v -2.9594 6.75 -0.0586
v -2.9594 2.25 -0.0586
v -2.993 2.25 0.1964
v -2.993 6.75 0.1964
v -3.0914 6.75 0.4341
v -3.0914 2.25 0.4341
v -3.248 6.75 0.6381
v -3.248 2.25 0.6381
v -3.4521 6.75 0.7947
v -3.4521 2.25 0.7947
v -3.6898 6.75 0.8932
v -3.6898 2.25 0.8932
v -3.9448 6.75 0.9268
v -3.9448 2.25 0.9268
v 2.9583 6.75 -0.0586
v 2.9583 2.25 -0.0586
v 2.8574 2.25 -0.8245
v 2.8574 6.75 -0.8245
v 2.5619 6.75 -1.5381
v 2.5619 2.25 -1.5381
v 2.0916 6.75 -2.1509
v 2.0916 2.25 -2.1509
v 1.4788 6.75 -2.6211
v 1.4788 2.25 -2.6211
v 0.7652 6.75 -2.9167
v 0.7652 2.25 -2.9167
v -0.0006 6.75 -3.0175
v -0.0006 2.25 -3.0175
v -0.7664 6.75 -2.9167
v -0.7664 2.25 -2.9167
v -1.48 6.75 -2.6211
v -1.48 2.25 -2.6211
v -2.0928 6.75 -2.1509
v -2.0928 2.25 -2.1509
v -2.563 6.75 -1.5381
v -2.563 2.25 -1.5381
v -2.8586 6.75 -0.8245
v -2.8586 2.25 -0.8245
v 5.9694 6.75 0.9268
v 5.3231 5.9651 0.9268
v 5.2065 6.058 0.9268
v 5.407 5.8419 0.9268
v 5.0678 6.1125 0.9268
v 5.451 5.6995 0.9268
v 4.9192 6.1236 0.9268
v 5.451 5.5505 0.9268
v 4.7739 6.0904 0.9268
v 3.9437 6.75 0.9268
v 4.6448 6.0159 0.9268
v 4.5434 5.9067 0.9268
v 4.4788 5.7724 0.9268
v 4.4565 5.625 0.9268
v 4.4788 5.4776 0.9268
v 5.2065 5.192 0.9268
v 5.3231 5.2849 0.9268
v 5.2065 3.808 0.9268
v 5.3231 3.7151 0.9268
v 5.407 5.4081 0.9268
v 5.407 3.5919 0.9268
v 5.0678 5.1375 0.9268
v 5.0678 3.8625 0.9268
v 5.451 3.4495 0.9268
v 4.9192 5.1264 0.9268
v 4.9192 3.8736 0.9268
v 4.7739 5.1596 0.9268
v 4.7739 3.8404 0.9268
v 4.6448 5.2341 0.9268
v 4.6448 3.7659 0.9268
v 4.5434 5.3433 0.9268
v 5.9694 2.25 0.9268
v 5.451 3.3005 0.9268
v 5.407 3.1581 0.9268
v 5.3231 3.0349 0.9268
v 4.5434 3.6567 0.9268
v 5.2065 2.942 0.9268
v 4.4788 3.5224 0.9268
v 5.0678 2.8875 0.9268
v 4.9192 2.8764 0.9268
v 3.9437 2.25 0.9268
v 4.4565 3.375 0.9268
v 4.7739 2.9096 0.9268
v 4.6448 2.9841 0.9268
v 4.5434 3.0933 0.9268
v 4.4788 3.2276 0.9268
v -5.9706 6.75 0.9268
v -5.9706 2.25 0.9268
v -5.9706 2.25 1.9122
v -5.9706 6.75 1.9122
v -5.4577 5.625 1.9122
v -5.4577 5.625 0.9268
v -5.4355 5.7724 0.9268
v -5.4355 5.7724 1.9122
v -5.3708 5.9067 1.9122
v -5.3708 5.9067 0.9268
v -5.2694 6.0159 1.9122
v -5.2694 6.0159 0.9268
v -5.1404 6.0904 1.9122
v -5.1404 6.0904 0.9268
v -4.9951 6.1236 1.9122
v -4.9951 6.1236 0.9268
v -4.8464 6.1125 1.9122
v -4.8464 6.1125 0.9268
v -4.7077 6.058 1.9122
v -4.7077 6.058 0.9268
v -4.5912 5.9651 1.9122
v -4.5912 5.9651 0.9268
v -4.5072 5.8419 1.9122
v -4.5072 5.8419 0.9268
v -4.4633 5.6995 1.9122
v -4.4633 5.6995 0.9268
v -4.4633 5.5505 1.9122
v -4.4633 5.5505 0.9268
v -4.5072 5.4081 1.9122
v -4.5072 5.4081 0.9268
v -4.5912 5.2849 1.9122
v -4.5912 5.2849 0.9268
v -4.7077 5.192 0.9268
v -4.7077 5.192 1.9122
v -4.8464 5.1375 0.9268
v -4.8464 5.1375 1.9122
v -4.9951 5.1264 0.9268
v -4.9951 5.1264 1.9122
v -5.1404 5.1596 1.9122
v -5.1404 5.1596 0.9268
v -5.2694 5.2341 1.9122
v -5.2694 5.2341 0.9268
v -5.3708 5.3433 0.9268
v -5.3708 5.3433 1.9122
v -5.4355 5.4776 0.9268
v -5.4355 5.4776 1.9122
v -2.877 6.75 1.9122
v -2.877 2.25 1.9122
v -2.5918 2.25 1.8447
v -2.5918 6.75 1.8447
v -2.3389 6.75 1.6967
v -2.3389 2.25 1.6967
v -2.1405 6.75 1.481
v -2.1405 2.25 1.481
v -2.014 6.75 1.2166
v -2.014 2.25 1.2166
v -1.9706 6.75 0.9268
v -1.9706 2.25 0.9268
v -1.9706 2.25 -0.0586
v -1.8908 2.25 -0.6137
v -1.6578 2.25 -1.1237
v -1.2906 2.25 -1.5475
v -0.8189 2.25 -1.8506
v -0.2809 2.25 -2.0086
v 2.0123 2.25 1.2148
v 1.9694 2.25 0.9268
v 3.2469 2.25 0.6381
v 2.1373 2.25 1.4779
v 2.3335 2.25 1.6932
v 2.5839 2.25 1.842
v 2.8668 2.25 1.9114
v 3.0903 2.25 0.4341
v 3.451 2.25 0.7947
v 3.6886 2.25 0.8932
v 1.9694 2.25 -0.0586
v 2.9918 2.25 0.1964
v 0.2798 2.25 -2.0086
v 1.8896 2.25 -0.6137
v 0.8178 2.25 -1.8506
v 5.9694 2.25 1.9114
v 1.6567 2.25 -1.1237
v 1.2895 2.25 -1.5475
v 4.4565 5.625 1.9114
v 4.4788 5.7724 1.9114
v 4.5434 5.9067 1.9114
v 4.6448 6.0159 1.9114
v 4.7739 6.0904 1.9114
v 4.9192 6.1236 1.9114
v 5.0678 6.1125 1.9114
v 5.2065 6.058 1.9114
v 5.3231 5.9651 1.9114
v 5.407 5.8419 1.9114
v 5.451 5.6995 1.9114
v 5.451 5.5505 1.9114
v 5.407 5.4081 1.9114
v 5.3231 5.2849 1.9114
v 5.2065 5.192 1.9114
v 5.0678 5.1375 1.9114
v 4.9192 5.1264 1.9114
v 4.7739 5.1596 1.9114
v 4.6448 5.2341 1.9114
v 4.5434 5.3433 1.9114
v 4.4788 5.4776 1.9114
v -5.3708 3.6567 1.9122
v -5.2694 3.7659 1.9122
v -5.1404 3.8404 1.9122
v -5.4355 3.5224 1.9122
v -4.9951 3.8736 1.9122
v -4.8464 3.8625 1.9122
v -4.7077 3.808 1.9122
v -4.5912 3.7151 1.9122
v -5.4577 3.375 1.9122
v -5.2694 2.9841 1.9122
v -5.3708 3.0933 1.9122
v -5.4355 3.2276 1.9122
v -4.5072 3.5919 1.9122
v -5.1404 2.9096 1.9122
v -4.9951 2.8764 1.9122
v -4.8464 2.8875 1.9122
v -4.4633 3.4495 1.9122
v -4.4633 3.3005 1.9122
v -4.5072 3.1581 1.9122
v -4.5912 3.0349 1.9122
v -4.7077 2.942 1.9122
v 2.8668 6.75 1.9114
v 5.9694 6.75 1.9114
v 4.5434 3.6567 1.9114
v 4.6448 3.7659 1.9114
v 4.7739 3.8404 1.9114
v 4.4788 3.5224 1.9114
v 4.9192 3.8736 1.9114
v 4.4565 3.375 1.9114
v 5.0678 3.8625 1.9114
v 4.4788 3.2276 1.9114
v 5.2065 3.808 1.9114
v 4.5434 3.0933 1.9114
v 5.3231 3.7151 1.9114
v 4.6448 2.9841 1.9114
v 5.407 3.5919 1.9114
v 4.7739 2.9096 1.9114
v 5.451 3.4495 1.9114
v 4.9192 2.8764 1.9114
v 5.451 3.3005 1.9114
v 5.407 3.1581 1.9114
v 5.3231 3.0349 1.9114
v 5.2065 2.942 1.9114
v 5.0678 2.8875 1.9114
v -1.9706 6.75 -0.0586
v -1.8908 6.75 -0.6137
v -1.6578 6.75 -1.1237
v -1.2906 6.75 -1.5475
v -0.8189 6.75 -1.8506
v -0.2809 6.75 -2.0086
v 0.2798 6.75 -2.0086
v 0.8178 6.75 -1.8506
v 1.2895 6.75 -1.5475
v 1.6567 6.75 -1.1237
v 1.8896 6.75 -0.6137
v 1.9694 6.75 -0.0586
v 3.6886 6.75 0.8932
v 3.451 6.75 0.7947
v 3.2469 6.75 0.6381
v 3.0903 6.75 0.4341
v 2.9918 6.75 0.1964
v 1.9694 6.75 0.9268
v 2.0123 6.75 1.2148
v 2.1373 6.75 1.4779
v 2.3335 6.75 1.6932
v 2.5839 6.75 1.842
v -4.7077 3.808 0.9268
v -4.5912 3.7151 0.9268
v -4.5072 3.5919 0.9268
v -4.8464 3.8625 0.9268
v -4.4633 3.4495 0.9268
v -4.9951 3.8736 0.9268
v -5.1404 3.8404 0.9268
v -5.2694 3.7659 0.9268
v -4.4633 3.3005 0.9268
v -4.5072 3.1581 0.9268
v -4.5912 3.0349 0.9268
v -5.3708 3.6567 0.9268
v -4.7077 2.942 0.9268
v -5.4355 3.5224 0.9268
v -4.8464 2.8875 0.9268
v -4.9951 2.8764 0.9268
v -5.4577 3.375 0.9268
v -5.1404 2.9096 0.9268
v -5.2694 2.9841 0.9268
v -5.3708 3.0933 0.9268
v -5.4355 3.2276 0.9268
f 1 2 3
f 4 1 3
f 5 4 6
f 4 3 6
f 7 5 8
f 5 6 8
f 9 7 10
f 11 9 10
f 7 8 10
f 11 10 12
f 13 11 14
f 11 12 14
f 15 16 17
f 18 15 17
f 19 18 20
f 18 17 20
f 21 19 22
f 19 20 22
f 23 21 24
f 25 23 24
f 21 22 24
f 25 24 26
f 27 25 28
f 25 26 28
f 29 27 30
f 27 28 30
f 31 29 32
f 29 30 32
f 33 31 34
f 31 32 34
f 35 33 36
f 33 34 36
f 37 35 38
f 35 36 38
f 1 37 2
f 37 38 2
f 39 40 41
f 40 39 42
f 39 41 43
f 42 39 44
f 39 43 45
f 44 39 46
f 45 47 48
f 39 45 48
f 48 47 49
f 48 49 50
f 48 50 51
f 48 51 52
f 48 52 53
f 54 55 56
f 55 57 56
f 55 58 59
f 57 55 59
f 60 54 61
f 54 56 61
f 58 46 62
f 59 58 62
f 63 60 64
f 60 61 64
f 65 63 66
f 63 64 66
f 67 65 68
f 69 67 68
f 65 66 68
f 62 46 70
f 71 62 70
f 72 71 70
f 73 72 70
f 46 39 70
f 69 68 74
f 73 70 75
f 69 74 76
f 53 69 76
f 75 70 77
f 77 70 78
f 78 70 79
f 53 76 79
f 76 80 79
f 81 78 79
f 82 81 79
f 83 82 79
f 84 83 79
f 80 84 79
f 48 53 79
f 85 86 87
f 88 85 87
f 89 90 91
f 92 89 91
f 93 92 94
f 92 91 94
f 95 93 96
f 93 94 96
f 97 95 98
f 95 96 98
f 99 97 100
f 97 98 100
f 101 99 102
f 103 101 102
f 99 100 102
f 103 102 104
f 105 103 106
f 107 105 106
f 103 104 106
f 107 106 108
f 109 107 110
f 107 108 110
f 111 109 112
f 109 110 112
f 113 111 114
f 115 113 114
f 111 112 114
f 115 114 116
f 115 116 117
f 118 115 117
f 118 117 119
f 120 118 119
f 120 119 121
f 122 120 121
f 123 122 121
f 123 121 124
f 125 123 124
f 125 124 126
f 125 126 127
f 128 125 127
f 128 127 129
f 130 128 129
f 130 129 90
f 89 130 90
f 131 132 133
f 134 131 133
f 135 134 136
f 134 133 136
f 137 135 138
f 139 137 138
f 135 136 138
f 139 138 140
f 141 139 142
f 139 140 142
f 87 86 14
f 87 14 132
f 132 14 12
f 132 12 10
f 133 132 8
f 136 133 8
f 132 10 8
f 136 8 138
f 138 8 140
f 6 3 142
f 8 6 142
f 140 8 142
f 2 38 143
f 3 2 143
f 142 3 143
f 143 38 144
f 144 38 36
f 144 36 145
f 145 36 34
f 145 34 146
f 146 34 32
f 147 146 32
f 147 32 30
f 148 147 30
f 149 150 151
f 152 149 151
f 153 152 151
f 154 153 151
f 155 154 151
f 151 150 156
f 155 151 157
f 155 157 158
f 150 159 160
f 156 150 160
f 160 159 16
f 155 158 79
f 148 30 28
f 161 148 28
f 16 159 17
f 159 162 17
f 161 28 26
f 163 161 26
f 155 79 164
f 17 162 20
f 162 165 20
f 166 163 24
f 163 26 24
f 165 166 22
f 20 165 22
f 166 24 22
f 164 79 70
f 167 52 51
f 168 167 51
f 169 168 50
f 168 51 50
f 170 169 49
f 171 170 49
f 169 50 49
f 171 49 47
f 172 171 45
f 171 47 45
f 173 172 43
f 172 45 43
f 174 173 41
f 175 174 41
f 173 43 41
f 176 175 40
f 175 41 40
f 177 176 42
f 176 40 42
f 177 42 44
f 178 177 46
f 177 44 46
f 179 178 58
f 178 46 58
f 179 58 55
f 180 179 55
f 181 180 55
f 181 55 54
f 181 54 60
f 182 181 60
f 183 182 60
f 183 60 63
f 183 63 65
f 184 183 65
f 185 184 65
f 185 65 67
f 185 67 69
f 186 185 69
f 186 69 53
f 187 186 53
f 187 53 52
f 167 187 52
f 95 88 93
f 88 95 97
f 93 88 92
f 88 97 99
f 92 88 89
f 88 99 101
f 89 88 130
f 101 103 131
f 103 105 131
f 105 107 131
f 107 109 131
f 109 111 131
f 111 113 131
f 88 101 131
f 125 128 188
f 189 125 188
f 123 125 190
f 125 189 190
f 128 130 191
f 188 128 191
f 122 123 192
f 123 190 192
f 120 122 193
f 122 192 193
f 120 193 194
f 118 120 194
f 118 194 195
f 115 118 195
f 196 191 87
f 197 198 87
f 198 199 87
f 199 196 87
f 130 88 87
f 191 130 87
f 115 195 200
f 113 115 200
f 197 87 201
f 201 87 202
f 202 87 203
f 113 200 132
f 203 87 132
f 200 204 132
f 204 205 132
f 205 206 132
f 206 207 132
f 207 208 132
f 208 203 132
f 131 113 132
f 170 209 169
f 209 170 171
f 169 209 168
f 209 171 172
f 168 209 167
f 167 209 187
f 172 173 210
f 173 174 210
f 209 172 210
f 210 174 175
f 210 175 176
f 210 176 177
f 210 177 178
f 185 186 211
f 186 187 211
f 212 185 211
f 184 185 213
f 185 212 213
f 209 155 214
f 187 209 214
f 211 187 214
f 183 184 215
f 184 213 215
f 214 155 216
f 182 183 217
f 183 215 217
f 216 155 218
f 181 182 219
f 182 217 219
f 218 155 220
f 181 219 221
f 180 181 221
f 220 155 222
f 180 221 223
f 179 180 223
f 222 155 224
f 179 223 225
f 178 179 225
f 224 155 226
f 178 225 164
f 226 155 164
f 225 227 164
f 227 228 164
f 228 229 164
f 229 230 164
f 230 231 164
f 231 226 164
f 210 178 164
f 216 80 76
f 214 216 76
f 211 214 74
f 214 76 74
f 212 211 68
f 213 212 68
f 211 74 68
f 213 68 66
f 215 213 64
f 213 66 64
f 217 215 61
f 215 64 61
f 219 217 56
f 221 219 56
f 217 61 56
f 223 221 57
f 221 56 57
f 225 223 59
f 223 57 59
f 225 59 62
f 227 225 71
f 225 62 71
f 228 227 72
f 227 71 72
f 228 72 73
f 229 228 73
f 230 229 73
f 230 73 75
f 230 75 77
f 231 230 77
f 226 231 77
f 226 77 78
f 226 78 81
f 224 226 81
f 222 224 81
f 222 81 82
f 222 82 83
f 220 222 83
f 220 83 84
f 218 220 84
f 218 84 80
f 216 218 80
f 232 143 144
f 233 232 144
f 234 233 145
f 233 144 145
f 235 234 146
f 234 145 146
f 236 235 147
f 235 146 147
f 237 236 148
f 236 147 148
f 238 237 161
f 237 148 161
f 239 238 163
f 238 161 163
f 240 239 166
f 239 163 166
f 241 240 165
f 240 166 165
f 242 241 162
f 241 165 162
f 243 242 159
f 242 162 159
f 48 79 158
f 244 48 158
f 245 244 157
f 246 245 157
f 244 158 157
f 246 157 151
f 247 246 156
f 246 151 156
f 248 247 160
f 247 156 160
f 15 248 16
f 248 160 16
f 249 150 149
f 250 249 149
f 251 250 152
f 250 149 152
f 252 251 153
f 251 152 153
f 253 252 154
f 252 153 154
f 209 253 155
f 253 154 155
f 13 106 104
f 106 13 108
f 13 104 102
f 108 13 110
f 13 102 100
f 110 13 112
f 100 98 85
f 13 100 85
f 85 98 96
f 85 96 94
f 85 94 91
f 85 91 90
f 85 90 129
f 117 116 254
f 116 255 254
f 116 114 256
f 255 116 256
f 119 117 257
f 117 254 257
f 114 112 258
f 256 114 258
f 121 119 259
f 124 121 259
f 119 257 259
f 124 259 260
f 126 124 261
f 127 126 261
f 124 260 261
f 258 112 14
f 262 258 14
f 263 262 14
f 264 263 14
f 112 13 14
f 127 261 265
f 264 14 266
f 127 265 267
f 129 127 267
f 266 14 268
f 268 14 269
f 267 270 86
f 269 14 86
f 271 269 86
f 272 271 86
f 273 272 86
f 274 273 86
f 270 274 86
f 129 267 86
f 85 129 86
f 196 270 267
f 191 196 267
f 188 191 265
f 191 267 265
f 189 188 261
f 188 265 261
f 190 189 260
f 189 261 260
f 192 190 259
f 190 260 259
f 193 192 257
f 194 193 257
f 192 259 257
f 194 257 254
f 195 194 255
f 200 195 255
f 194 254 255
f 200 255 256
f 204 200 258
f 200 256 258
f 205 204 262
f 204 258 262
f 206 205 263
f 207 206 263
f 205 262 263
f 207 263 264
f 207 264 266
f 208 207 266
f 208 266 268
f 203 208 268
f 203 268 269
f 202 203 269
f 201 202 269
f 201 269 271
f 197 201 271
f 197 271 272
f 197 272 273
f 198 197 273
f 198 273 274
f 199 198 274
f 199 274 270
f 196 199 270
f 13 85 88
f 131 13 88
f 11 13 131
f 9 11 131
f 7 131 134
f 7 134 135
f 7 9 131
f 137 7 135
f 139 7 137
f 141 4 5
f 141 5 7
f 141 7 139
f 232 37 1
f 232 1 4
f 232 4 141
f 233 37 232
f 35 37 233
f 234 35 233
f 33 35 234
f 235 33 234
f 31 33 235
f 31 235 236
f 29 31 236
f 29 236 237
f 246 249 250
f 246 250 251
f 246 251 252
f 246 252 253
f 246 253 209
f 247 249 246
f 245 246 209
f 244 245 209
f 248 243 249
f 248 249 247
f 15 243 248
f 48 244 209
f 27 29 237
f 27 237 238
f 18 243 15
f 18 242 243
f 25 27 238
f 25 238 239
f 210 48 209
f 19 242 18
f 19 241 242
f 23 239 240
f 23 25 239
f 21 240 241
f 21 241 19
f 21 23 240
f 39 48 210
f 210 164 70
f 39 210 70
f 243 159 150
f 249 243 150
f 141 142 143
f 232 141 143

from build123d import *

# Parameters (mm, degrees)
Y_KSEKLIK_EKSTR_ZYON1_DEPTH = 9
IZIM2_R                     = 1
KES_EKSTR_ZYON1_DEPTH       = 9
L_EK1_SCALE                 = 0.5


with BuildPart() as part:
    # Çizim1 → Yükseklik-Ekstrüzyon1 (new body)
    with BuildSketch(Plane(origin=(0, 0, 0), x_dir=(1, 0, 0), z_dir=(0, 1, 0))):
        with BuildLine():
            Line((3.94, 0), (3.94, -1.970806212))
            ThreePointArc((3.94, -1.970806212), (4.455977206, -3.302963323), (5.734671586, -3.94))
            Line((5.734671586, -3.94), (11.94, -3.94))
            Line((11.94, -3.94), (11.94, -1.970806212))
            Line((11.94, -1.970806212), (7.888485675, -1.970806212))
            ThreePointArc((7.888485675, -1.970806212), (6.494915238, -1.393570437), (5.917679463, 0))
            ThreePointArc((5.917679463, 0), (0, 5.917679463), (-5.917679463, 0))
            ThreePointArc((-5.917679463, 0), (-6.494915238, -1.393570437), (-7.888485675, -1.970806212))
            Line((-7.888485675, -1.970806212), (-11.94, -1.970806212))
            Line((-11.94, -1.970806212), (-11.94, -3.941612423))
            Line((-11.94, -3.941612423), (-5.752940471, -3.941612423))
            ThreePointArc((-5.752940471, -3.941612423), (-4.462169762, -3.309726511), (-3.94, -1.970806212))
            Line((-3.94, -1.970806212), (-3.94, 0))
            ThreePointArc((-3.94, 0), (0, 3.94), (3.94, 0))
        make_face()
    extrude(amount=Y_KSEKLIK_EKSTR_ZYON1_DEPTH)

    # Çizim2 → Kes-Ekstrüzyon1 (cut)
    with BuildSketch(Plane(origin=(0, 0, 1.970806212), x_dir=(-1, 0, 0), z_dir=(0, 0, -1))):
        with Locations((-9.914242837, 6.75)):
            Circle(IZIM2_R)
        with Locations((-9.914242837, 2.25)):
            Circle(IZIM2_R)
        with Locations((9.914242837, 2.25)):
            Circle(IZIM2_R)
        with Locations((9.914242837, 6.75)):
            Circle(IZIM2_R)
    extrude(amount=-KES_EKSTR_ZYON1_DEPTH, mode=Mode.SUBTRACT)


with BuildPart() as part_1:
    # Ölçek1: scaled about (-0.001148425, 4.5, -0.117296344)
    add(part.part.scale(L_EK1_SCALE).moved(Location((-0.000574213, 2.25, -0.058648172))))


solid = part_1.part
